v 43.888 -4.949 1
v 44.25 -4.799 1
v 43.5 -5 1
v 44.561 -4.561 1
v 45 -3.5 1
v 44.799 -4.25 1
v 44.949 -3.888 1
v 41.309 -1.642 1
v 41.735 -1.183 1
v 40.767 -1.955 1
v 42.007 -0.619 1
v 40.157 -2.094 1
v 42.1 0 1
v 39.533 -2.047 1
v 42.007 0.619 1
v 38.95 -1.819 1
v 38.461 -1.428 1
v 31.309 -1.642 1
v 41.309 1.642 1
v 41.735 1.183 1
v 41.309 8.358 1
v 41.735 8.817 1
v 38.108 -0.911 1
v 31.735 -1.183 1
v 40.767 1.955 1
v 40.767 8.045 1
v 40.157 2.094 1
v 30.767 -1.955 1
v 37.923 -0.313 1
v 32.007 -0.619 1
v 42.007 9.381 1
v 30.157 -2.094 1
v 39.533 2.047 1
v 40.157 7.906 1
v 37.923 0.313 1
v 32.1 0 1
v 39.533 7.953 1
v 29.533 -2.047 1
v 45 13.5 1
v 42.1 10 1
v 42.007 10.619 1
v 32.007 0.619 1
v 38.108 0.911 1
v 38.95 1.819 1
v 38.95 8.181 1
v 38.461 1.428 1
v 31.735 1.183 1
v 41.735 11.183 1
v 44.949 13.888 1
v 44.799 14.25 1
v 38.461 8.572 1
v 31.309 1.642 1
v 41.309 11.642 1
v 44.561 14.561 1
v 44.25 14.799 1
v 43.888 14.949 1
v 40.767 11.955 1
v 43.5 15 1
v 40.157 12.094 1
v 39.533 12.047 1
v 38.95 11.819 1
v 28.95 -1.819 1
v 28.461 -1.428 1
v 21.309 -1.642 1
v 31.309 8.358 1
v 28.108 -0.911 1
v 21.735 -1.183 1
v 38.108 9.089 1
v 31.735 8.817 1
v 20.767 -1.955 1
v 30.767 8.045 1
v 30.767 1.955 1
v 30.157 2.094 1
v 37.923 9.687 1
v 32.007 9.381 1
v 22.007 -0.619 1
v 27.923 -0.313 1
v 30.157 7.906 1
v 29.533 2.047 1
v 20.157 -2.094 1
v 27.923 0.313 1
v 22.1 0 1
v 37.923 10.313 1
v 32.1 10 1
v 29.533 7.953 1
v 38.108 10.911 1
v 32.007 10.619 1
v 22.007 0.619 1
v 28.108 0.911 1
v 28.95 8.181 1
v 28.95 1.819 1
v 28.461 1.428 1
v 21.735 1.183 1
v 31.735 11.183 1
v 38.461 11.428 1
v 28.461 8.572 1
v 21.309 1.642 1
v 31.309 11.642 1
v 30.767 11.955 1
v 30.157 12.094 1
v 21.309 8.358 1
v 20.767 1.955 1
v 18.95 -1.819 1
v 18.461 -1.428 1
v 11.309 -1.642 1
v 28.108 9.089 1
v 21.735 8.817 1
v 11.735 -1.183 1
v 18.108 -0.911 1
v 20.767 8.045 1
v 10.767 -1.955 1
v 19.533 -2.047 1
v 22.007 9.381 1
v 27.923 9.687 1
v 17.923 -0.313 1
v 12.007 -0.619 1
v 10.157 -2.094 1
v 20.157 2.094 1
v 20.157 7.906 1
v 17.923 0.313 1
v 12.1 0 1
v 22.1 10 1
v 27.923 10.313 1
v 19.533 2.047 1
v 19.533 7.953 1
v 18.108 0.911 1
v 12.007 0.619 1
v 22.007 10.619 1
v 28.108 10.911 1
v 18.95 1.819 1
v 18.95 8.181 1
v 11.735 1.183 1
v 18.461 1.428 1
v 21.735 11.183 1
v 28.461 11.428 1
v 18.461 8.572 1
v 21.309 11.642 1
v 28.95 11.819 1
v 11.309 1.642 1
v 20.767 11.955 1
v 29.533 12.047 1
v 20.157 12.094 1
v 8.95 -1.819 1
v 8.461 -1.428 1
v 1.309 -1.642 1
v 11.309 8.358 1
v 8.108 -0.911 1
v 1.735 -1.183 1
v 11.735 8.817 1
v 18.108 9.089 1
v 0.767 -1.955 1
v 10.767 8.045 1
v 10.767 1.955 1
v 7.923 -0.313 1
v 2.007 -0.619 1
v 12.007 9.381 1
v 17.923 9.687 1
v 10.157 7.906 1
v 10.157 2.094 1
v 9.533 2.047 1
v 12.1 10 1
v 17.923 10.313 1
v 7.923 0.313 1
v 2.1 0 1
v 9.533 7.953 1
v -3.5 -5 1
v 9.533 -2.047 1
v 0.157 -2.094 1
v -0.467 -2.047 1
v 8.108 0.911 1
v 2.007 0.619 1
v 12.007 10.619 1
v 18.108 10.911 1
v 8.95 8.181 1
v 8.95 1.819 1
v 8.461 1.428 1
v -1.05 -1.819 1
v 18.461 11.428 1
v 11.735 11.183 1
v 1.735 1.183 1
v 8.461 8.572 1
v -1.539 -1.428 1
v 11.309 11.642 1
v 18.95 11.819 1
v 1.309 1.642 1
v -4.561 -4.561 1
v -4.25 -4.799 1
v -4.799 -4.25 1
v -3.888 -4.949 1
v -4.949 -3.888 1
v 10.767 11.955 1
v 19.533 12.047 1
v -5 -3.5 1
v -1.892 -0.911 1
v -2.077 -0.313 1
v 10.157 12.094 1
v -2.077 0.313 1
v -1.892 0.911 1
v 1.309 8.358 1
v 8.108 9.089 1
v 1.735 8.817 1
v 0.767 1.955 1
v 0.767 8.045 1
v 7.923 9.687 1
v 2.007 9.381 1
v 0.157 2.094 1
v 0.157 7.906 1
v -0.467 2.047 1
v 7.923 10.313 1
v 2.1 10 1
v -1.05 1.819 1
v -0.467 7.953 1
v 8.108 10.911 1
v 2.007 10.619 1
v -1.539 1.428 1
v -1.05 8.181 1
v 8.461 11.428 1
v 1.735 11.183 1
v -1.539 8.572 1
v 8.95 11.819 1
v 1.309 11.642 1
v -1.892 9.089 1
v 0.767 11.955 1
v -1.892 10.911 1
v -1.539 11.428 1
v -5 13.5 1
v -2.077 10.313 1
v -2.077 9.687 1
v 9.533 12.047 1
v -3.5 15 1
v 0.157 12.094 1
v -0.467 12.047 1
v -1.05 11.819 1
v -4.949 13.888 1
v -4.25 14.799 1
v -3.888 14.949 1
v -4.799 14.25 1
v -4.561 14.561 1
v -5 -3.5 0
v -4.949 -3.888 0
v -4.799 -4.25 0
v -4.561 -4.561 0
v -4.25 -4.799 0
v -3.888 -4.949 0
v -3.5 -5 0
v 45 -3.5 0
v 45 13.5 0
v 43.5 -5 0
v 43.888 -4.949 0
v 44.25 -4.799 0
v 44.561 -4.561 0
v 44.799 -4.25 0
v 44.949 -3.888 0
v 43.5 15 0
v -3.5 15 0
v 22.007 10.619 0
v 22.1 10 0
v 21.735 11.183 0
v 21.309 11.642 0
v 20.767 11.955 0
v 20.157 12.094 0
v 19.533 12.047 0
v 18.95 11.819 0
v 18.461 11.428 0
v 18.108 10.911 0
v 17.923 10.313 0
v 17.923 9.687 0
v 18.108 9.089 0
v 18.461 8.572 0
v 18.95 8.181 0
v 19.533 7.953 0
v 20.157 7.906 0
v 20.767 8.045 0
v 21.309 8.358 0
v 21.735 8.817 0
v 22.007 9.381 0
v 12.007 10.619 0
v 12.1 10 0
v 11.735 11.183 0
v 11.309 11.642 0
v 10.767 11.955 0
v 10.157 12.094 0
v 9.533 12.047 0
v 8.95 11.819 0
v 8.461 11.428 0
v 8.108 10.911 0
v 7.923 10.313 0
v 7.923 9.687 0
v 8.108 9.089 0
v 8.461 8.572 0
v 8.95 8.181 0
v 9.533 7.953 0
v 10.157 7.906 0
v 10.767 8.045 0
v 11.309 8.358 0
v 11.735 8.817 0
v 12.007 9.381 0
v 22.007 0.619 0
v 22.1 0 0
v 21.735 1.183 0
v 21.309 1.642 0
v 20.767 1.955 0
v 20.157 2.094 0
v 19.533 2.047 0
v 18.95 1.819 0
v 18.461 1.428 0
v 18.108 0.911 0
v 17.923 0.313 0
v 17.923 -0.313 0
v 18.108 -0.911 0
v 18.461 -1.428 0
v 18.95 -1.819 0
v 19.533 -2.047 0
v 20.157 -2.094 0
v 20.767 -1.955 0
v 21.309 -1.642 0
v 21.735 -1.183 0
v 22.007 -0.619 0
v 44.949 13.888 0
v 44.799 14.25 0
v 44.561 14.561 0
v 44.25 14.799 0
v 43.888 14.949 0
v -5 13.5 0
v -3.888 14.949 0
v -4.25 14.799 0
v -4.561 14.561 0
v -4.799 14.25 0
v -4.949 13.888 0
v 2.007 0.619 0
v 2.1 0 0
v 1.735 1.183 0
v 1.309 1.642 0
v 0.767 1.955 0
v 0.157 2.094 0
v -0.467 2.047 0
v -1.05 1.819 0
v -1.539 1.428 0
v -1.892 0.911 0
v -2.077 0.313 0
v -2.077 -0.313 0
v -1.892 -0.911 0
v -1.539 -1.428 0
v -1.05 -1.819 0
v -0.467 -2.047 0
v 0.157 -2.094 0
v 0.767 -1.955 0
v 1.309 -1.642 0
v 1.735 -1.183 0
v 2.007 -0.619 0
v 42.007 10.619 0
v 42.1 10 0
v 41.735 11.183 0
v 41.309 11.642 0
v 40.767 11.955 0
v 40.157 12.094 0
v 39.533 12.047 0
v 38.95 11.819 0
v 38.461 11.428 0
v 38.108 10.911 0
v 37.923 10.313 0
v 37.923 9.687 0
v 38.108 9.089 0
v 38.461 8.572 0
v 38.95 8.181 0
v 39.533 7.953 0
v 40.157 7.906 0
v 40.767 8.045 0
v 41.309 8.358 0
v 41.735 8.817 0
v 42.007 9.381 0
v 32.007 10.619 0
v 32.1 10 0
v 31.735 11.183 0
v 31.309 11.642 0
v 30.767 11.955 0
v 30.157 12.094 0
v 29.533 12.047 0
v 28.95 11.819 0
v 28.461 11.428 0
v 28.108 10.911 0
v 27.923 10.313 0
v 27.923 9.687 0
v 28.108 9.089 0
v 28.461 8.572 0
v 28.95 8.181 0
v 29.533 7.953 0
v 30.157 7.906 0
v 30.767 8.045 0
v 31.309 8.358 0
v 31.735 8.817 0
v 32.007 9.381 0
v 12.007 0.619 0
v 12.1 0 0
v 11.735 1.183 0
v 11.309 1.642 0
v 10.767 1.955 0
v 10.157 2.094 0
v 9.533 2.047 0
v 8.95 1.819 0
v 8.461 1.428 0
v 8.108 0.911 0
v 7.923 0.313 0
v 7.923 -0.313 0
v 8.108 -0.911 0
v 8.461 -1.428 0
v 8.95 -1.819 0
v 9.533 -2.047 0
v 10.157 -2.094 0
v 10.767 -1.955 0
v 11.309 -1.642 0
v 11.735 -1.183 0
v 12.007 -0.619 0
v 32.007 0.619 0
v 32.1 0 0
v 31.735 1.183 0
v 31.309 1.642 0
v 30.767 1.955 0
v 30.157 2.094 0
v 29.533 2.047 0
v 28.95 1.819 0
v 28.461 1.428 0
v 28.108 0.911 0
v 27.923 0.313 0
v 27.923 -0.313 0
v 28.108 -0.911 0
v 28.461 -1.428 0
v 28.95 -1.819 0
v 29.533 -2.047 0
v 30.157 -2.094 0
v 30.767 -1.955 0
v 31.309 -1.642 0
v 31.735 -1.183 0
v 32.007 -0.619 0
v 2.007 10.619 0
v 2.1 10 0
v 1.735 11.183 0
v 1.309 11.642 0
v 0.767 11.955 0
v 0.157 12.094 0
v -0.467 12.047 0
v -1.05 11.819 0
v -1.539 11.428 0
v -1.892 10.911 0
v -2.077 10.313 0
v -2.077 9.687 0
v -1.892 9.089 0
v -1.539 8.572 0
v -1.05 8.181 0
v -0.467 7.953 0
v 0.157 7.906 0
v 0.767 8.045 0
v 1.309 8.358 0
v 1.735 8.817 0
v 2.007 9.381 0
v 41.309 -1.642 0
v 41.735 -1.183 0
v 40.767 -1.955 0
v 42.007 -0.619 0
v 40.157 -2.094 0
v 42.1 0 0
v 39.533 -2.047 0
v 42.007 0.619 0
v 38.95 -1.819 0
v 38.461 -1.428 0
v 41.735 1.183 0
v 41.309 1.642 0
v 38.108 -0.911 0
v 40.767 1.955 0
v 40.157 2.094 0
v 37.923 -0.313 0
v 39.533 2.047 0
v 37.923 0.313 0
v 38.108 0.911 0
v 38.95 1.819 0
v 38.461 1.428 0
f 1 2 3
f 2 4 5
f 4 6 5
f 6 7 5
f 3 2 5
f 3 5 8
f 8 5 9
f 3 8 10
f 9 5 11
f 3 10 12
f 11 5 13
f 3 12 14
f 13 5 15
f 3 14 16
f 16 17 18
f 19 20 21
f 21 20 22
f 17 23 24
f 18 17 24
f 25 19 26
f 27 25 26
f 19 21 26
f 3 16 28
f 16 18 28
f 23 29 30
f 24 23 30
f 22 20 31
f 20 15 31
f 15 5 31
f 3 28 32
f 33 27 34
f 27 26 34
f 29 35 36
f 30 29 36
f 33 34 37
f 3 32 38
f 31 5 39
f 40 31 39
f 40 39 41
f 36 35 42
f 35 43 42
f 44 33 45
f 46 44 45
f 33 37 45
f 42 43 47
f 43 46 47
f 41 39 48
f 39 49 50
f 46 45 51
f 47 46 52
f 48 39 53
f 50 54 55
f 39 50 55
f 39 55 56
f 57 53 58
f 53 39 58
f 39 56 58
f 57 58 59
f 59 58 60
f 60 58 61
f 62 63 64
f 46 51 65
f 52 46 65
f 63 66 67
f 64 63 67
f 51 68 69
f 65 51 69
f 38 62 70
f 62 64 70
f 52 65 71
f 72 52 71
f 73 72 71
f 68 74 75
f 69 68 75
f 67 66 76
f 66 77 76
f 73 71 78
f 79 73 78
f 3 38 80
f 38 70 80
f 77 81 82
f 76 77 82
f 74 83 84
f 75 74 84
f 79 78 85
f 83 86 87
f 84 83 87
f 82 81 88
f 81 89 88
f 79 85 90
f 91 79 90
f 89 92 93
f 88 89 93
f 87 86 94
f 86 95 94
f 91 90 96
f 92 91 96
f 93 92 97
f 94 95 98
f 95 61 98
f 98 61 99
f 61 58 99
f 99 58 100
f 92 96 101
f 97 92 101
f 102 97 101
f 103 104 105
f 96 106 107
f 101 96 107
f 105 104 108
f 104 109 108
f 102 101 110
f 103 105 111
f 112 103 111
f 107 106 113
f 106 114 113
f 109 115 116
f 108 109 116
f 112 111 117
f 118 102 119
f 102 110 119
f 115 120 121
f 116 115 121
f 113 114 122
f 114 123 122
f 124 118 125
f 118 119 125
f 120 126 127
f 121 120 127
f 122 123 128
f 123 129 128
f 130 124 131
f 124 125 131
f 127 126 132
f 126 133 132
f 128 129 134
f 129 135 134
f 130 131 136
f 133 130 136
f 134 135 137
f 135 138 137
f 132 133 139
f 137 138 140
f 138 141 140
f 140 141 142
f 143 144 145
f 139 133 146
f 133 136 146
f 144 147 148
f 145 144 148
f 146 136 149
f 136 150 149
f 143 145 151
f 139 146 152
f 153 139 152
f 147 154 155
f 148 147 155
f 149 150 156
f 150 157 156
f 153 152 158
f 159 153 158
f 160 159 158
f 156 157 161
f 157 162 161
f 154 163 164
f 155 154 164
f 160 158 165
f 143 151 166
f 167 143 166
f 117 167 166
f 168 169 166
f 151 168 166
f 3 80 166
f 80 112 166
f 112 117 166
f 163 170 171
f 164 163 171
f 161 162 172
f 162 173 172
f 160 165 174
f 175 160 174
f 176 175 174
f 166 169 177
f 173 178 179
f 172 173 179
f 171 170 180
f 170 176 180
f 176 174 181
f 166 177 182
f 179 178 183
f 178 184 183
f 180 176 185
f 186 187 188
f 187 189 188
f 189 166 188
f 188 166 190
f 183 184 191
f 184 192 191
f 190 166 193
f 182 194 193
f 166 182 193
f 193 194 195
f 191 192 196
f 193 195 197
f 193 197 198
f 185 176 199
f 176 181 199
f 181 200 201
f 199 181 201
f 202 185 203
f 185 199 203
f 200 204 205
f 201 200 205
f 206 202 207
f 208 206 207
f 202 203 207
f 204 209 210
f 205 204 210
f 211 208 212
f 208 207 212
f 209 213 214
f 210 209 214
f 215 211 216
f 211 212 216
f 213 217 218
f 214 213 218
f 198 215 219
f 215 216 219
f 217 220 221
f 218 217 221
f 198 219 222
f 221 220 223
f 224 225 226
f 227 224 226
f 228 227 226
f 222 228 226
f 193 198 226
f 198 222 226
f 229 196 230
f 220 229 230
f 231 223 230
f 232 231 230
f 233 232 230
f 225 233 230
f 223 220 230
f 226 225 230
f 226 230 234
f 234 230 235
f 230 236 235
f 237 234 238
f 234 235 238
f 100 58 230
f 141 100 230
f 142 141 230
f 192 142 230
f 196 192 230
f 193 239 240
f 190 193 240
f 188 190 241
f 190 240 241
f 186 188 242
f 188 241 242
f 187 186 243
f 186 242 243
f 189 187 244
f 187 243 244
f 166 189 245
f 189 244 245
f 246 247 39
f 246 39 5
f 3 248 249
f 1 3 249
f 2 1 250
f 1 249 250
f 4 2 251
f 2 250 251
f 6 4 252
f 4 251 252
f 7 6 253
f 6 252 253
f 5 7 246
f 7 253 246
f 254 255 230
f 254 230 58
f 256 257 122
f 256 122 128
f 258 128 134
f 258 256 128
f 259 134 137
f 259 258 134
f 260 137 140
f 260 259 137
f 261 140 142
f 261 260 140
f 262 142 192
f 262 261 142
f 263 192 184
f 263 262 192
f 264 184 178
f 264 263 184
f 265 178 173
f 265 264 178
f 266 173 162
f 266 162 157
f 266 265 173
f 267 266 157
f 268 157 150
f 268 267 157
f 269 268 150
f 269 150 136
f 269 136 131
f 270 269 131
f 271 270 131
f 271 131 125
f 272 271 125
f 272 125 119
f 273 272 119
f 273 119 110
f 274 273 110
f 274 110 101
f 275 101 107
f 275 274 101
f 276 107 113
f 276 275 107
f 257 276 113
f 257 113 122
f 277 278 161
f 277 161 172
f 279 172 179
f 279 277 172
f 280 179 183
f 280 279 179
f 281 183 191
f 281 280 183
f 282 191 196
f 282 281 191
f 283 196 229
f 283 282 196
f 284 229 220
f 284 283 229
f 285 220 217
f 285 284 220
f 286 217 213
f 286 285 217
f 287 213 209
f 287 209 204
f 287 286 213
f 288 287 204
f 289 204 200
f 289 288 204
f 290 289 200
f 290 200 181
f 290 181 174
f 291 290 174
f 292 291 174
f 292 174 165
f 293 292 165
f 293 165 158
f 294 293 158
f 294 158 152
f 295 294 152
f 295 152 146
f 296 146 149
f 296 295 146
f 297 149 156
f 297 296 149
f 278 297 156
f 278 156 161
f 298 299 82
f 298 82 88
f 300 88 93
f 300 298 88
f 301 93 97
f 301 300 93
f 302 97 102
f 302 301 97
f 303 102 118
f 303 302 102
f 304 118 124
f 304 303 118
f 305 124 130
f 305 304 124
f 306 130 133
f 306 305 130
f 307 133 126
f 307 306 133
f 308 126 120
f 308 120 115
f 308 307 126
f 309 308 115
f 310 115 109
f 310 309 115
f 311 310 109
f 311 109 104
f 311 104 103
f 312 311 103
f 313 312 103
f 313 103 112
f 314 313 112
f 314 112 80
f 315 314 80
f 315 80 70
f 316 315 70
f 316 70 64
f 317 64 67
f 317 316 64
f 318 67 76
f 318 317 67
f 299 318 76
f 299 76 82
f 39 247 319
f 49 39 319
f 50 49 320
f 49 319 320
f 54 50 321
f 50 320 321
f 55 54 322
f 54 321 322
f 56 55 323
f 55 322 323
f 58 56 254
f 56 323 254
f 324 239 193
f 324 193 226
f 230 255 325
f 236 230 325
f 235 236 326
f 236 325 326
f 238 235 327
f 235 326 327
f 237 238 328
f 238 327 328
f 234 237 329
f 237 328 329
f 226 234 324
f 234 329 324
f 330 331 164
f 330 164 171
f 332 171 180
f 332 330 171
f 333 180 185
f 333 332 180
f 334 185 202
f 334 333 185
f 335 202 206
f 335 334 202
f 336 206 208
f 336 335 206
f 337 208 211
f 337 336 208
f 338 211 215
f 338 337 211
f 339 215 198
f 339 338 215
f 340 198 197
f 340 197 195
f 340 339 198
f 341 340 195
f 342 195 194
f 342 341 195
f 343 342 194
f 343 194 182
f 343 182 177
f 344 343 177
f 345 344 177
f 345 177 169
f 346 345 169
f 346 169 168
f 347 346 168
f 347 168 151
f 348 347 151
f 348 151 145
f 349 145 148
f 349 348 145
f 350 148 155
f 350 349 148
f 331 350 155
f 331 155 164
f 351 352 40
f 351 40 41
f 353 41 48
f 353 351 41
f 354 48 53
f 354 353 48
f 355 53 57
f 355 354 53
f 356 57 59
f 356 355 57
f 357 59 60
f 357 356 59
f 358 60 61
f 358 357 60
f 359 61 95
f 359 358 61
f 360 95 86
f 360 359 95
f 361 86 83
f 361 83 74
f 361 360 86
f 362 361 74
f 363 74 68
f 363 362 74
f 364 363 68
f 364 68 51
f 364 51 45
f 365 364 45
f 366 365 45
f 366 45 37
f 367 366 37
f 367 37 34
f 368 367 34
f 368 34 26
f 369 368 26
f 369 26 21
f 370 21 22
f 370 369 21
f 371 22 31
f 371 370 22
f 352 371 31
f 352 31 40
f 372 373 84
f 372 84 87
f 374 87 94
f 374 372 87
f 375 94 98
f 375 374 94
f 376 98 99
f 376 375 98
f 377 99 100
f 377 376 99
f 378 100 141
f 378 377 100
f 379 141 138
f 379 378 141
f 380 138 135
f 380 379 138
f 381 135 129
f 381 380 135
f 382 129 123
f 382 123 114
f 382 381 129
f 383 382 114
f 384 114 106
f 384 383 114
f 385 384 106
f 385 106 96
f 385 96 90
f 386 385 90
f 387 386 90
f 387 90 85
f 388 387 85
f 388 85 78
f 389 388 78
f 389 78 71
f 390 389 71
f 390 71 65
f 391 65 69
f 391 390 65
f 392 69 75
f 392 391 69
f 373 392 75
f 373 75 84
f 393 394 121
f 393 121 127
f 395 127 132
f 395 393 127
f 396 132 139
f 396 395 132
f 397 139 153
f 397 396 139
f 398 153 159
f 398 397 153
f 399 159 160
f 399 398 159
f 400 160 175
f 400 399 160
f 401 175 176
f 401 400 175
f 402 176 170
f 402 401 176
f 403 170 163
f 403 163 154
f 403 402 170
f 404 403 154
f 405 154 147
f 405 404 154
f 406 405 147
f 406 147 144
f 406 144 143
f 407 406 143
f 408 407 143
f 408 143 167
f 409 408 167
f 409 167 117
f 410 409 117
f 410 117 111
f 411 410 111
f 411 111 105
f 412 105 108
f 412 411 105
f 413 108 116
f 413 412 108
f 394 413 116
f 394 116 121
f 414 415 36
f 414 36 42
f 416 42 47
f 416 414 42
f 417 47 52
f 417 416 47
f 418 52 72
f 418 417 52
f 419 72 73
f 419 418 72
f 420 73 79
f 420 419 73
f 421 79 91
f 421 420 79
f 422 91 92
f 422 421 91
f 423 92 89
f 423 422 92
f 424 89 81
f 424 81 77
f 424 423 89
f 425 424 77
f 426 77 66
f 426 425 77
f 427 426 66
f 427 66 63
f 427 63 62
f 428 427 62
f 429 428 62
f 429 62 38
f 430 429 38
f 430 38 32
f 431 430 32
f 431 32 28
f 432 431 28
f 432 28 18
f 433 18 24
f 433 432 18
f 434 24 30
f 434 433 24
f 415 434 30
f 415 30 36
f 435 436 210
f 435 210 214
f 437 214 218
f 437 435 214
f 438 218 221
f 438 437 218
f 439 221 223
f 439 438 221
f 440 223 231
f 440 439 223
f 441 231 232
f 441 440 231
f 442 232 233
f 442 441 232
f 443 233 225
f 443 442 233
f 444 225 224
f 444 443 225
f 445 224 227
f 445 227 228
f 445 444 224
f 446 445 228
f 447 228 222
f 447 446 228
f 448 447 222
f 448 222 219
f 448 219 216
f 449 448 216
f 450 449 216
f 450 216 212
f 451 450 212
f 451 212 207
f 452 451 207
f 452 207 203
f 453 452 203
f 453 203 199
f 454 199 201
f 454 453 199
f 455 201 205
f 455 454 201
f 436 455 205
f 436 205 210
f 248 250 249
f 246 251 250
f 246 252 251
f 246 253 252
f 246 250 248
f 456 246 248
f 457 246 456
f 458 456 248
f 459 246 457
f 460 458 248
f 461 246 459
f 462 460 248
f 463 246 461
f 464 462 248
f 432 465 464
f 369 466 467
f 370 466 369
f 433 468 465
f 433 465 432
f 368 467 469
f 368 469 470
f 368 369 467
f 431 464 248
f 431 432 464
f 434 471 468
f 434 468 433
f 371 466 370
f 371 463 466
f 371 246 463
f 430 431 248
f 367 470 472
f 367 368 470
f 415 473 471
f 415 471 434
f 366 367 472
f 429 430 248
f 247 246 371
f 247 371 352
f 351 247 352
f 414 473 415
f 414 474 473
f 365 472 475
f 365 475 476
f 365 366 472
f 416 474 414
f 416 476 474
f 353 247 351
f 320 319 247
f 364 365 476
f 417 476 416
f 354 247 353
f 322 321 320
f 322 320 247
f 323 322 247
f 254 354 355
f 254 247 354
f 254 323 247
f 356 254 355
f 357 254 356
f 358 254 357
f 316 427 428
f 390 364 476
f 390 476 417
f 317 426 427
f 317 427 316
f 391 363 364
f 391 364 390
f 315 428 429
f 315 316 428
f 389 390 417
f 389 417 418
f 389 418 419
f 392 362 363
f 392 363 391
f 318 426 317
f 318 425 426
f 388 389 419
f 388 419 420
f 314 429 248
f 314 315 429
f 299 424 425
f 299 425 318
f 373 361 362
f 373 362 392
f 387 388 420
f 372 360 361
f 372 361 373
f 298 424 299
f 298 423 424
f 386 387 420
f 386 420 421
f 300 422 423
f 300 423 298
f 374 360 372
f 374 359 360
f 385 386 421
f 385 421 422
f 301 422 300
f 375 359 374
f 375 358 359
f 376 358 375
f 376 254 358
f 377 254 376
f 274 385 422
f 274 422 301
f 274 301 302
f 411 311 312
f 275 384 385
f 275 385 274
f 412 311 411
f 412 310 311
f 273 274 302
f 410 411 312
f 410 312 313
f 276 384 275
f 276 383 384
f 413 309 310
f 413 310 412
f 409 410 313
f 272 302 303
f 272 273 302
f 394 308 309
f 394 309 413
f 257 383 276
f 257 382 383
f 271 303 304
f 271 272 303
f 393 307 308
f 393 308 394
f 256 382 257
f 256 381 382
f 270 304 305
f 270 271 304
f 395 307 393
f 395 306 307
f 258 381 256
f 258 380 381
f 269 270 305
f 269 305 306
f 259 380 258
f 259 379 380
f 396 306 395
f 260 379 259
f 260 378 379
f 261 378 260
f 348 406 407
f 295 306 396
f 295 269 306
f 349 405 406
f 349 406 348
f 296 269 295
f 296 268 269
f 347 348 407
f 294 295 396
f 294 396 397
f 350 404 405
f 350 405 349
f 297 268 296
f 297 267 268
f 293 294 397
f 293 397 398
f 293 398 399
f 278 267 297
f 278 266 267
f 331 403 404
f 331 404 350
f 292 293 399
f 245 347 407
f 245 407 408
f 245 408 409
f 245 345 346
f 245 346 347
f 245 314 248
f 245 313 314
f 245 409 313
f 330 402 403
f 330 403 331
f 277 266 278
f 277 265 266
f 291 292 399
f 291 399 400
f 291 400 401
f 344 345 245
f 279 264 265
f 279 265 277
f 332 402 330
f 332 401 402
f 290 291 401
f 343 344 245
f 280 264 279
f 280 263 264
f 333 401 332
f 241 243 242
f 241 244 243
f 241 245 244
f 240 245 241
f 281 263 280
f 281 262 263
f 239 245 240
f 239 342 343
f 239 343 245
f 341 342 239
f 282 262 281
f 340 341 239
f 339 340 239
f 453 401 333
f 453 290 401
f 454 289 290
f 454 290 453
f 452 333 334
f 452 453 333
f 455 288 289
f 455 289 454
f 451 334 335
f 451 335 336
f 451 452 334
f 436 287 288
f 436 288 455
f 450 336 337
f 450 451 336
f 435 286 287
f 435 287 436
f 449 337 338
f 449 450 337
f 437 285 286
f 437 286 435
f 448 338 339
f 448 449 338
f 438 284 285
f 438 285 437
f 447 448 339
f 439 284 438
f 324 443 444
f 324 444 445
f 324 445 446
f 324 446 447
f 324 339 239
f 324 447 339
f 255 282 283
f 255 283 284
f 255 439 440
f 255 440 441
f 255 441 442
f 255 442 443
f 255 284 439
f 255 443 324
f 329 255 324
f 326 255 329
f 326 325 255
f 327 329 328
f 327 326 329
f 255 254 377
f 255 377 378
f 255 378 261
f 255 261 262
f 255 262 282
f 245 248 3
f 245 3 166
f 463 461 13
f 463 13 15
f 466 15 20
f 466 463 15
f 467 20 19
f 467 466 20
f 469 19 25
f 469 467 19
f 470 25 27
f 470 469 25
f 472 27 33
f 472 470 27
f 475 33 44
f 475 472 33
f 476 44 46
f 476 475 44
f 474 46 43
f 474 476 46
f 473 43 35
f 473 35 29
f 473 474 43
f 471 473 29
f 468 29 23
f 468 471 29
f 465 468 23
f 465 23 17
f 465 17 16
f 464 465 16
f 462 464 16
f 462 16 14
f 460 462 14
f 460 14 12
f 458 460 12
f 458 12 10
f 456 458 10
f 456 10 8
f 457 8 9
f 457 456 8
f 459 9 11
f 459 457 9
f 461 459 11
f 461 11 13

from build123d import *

# Parameters (mm, degrees)
SKETCH_R  = 2.1
PAD_DEPTH = 1


with BuildPart() as part:
    # Sketch → Pad (new body)
    with BuildSketch(Plane.XY):
        with BuildLine():
            Line((-3.5, 15), (43.5, 15))
            ThreePointArc((45, 13.5), (44.56066, 14.56066), (43.5, 15))
            Line((45, 13.5), (45, -3.5))
            ThreePointArc((43.5, -5), (44.56066, -4.56066), (45, -3.5))
            Line((43.5, -5), (-3.5, -5))
            ThreePointArc((-5, -3.5), (-4.56066, -4.56066), (-3.5, -5))
            Line((-5, -3.5), (-5, 13.5))
            ThreePointArc((-3.5, 15), (-4.56066, 14.56066), (-5, 13.5))
        make_face()
        Circle(SKETCH_R, mode=Mode.SUBTRACT)
        with Locations((0, 10)):
            Circle(SKETCH_R, mode=Mode.SUBTRACT)
        with Locations((10, 0)):
            Circle(SKETCH_R, mode=Mode.SUBTRACT)
        with Locations((20, 0)):
            Circle(SKETCH_R, mode=Mode.SUBTRACT)
        with Locations((30, 0)):
            Circle(SKETCH_R, mode=Mode.SUBTRACT)
        with Locations((40, 0)):
            Circle(SKETCH_R, mode=Mode.SUBTRACT)
        with Locations((10, 10)):
            Circle(SKETCH_R, mode=Mode.SUBTRACT)
        with Locations((20, 10)):
            Circle(SKETCH_R, mode=Mode.SUBTRACT)
        with Locations((30, 10)):
            Circle(SKETCH_R, mode=Mode.SUBTRACT)
        with Locations((40, 10)):
            Circle(SKETCH_R, mode=Mode.SUBTRACT)
    extrude(amount=PAD_DEPTH)


solid = part.part
